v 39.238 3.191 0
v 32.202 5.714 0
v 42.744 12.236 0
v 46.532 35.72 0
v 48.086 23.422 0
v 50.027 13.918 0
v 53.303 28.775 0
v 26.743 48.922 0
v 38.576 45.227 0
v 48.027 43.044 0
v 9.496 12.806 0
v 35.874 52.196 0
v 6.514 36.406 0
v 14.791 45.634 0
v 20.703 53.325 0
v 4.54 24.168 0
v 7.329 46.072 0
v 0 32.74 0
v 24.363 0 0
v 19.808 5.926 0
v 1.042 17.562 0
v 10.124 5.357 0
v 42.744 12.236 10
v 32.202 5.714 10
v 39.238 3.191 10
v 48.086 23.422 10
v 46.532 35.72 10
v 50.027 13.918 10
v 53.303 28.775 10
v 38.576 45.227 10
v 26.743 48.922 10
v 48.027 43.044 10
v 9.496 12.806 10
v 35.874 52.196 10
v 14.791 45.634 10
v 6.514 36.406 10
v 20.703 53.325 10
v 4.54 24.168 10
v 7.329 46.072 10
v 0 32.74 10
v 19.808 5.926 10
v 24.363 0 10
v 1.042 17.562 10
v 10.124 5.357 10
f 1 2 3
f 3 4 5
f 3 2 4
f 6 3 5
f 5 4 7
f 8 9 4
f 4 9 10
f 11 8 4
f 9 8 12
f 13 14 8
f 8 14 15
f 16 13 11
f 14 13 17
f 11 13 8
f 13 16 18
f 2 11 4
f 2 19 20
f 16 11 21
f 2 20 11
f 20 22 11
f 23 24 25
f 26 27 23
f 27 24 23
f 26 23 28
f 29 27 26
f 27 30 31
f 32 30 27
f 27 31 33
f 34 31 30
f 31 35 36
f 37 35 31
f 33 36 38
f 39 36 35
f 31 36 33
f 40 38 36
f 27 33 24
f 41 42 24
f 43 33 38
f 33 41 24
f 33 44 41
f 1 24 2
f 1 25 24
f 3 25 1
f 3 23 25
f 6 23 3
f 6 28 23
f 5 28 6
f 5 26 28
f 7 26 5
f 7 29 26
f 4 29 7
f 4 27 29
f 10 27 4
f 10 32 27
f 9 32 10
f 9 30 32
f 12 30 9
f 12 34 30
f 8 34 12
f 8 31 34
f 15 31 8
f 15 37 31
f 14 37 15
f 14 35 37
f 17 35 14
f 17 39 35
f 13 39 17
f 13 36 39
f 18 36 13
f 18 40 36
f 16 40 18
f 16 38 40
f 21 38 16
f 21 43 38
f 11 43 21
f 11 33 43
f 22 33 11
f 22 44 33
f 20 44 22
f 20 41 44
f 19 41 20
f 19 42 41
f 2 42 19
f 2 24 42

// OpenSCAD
$fn = 32;

// ----------------------------------------------------------------------
// Chain sprocket: 11 teeth, 22 mm root radius
// ----------------------------------------------------------------------

// --- parameters (mm) ---
profile_height = 10;      // extrusion height
profile_points = 22;      // points of the closed outline

profile = [[48.086, 23.422], [53.303, 28.775], [46.532, 35.72], [48.027, 43.044], [38.576, 45.227], [35.874, 52.196], [26.743, 48.922], [20.703, 53.325], [14.791, 45.634], [7.329, 46.072], [6.514, 36.406], [0, 32.74], [4.54, 24.168], [1.042, 17.562], [9.496, 12.806], [10.124, 5.357], [19.808, 5.926], [24.363, 0], [32.202, 5.714], [39.238, 3.191], [42.744, 12.236], [50.027, 13.918]];  // single closed polygon, 22 points, counter clockwise

// --- the one profile operation ---
linear_extrude(height = profile_height) polygon(points = profile);
